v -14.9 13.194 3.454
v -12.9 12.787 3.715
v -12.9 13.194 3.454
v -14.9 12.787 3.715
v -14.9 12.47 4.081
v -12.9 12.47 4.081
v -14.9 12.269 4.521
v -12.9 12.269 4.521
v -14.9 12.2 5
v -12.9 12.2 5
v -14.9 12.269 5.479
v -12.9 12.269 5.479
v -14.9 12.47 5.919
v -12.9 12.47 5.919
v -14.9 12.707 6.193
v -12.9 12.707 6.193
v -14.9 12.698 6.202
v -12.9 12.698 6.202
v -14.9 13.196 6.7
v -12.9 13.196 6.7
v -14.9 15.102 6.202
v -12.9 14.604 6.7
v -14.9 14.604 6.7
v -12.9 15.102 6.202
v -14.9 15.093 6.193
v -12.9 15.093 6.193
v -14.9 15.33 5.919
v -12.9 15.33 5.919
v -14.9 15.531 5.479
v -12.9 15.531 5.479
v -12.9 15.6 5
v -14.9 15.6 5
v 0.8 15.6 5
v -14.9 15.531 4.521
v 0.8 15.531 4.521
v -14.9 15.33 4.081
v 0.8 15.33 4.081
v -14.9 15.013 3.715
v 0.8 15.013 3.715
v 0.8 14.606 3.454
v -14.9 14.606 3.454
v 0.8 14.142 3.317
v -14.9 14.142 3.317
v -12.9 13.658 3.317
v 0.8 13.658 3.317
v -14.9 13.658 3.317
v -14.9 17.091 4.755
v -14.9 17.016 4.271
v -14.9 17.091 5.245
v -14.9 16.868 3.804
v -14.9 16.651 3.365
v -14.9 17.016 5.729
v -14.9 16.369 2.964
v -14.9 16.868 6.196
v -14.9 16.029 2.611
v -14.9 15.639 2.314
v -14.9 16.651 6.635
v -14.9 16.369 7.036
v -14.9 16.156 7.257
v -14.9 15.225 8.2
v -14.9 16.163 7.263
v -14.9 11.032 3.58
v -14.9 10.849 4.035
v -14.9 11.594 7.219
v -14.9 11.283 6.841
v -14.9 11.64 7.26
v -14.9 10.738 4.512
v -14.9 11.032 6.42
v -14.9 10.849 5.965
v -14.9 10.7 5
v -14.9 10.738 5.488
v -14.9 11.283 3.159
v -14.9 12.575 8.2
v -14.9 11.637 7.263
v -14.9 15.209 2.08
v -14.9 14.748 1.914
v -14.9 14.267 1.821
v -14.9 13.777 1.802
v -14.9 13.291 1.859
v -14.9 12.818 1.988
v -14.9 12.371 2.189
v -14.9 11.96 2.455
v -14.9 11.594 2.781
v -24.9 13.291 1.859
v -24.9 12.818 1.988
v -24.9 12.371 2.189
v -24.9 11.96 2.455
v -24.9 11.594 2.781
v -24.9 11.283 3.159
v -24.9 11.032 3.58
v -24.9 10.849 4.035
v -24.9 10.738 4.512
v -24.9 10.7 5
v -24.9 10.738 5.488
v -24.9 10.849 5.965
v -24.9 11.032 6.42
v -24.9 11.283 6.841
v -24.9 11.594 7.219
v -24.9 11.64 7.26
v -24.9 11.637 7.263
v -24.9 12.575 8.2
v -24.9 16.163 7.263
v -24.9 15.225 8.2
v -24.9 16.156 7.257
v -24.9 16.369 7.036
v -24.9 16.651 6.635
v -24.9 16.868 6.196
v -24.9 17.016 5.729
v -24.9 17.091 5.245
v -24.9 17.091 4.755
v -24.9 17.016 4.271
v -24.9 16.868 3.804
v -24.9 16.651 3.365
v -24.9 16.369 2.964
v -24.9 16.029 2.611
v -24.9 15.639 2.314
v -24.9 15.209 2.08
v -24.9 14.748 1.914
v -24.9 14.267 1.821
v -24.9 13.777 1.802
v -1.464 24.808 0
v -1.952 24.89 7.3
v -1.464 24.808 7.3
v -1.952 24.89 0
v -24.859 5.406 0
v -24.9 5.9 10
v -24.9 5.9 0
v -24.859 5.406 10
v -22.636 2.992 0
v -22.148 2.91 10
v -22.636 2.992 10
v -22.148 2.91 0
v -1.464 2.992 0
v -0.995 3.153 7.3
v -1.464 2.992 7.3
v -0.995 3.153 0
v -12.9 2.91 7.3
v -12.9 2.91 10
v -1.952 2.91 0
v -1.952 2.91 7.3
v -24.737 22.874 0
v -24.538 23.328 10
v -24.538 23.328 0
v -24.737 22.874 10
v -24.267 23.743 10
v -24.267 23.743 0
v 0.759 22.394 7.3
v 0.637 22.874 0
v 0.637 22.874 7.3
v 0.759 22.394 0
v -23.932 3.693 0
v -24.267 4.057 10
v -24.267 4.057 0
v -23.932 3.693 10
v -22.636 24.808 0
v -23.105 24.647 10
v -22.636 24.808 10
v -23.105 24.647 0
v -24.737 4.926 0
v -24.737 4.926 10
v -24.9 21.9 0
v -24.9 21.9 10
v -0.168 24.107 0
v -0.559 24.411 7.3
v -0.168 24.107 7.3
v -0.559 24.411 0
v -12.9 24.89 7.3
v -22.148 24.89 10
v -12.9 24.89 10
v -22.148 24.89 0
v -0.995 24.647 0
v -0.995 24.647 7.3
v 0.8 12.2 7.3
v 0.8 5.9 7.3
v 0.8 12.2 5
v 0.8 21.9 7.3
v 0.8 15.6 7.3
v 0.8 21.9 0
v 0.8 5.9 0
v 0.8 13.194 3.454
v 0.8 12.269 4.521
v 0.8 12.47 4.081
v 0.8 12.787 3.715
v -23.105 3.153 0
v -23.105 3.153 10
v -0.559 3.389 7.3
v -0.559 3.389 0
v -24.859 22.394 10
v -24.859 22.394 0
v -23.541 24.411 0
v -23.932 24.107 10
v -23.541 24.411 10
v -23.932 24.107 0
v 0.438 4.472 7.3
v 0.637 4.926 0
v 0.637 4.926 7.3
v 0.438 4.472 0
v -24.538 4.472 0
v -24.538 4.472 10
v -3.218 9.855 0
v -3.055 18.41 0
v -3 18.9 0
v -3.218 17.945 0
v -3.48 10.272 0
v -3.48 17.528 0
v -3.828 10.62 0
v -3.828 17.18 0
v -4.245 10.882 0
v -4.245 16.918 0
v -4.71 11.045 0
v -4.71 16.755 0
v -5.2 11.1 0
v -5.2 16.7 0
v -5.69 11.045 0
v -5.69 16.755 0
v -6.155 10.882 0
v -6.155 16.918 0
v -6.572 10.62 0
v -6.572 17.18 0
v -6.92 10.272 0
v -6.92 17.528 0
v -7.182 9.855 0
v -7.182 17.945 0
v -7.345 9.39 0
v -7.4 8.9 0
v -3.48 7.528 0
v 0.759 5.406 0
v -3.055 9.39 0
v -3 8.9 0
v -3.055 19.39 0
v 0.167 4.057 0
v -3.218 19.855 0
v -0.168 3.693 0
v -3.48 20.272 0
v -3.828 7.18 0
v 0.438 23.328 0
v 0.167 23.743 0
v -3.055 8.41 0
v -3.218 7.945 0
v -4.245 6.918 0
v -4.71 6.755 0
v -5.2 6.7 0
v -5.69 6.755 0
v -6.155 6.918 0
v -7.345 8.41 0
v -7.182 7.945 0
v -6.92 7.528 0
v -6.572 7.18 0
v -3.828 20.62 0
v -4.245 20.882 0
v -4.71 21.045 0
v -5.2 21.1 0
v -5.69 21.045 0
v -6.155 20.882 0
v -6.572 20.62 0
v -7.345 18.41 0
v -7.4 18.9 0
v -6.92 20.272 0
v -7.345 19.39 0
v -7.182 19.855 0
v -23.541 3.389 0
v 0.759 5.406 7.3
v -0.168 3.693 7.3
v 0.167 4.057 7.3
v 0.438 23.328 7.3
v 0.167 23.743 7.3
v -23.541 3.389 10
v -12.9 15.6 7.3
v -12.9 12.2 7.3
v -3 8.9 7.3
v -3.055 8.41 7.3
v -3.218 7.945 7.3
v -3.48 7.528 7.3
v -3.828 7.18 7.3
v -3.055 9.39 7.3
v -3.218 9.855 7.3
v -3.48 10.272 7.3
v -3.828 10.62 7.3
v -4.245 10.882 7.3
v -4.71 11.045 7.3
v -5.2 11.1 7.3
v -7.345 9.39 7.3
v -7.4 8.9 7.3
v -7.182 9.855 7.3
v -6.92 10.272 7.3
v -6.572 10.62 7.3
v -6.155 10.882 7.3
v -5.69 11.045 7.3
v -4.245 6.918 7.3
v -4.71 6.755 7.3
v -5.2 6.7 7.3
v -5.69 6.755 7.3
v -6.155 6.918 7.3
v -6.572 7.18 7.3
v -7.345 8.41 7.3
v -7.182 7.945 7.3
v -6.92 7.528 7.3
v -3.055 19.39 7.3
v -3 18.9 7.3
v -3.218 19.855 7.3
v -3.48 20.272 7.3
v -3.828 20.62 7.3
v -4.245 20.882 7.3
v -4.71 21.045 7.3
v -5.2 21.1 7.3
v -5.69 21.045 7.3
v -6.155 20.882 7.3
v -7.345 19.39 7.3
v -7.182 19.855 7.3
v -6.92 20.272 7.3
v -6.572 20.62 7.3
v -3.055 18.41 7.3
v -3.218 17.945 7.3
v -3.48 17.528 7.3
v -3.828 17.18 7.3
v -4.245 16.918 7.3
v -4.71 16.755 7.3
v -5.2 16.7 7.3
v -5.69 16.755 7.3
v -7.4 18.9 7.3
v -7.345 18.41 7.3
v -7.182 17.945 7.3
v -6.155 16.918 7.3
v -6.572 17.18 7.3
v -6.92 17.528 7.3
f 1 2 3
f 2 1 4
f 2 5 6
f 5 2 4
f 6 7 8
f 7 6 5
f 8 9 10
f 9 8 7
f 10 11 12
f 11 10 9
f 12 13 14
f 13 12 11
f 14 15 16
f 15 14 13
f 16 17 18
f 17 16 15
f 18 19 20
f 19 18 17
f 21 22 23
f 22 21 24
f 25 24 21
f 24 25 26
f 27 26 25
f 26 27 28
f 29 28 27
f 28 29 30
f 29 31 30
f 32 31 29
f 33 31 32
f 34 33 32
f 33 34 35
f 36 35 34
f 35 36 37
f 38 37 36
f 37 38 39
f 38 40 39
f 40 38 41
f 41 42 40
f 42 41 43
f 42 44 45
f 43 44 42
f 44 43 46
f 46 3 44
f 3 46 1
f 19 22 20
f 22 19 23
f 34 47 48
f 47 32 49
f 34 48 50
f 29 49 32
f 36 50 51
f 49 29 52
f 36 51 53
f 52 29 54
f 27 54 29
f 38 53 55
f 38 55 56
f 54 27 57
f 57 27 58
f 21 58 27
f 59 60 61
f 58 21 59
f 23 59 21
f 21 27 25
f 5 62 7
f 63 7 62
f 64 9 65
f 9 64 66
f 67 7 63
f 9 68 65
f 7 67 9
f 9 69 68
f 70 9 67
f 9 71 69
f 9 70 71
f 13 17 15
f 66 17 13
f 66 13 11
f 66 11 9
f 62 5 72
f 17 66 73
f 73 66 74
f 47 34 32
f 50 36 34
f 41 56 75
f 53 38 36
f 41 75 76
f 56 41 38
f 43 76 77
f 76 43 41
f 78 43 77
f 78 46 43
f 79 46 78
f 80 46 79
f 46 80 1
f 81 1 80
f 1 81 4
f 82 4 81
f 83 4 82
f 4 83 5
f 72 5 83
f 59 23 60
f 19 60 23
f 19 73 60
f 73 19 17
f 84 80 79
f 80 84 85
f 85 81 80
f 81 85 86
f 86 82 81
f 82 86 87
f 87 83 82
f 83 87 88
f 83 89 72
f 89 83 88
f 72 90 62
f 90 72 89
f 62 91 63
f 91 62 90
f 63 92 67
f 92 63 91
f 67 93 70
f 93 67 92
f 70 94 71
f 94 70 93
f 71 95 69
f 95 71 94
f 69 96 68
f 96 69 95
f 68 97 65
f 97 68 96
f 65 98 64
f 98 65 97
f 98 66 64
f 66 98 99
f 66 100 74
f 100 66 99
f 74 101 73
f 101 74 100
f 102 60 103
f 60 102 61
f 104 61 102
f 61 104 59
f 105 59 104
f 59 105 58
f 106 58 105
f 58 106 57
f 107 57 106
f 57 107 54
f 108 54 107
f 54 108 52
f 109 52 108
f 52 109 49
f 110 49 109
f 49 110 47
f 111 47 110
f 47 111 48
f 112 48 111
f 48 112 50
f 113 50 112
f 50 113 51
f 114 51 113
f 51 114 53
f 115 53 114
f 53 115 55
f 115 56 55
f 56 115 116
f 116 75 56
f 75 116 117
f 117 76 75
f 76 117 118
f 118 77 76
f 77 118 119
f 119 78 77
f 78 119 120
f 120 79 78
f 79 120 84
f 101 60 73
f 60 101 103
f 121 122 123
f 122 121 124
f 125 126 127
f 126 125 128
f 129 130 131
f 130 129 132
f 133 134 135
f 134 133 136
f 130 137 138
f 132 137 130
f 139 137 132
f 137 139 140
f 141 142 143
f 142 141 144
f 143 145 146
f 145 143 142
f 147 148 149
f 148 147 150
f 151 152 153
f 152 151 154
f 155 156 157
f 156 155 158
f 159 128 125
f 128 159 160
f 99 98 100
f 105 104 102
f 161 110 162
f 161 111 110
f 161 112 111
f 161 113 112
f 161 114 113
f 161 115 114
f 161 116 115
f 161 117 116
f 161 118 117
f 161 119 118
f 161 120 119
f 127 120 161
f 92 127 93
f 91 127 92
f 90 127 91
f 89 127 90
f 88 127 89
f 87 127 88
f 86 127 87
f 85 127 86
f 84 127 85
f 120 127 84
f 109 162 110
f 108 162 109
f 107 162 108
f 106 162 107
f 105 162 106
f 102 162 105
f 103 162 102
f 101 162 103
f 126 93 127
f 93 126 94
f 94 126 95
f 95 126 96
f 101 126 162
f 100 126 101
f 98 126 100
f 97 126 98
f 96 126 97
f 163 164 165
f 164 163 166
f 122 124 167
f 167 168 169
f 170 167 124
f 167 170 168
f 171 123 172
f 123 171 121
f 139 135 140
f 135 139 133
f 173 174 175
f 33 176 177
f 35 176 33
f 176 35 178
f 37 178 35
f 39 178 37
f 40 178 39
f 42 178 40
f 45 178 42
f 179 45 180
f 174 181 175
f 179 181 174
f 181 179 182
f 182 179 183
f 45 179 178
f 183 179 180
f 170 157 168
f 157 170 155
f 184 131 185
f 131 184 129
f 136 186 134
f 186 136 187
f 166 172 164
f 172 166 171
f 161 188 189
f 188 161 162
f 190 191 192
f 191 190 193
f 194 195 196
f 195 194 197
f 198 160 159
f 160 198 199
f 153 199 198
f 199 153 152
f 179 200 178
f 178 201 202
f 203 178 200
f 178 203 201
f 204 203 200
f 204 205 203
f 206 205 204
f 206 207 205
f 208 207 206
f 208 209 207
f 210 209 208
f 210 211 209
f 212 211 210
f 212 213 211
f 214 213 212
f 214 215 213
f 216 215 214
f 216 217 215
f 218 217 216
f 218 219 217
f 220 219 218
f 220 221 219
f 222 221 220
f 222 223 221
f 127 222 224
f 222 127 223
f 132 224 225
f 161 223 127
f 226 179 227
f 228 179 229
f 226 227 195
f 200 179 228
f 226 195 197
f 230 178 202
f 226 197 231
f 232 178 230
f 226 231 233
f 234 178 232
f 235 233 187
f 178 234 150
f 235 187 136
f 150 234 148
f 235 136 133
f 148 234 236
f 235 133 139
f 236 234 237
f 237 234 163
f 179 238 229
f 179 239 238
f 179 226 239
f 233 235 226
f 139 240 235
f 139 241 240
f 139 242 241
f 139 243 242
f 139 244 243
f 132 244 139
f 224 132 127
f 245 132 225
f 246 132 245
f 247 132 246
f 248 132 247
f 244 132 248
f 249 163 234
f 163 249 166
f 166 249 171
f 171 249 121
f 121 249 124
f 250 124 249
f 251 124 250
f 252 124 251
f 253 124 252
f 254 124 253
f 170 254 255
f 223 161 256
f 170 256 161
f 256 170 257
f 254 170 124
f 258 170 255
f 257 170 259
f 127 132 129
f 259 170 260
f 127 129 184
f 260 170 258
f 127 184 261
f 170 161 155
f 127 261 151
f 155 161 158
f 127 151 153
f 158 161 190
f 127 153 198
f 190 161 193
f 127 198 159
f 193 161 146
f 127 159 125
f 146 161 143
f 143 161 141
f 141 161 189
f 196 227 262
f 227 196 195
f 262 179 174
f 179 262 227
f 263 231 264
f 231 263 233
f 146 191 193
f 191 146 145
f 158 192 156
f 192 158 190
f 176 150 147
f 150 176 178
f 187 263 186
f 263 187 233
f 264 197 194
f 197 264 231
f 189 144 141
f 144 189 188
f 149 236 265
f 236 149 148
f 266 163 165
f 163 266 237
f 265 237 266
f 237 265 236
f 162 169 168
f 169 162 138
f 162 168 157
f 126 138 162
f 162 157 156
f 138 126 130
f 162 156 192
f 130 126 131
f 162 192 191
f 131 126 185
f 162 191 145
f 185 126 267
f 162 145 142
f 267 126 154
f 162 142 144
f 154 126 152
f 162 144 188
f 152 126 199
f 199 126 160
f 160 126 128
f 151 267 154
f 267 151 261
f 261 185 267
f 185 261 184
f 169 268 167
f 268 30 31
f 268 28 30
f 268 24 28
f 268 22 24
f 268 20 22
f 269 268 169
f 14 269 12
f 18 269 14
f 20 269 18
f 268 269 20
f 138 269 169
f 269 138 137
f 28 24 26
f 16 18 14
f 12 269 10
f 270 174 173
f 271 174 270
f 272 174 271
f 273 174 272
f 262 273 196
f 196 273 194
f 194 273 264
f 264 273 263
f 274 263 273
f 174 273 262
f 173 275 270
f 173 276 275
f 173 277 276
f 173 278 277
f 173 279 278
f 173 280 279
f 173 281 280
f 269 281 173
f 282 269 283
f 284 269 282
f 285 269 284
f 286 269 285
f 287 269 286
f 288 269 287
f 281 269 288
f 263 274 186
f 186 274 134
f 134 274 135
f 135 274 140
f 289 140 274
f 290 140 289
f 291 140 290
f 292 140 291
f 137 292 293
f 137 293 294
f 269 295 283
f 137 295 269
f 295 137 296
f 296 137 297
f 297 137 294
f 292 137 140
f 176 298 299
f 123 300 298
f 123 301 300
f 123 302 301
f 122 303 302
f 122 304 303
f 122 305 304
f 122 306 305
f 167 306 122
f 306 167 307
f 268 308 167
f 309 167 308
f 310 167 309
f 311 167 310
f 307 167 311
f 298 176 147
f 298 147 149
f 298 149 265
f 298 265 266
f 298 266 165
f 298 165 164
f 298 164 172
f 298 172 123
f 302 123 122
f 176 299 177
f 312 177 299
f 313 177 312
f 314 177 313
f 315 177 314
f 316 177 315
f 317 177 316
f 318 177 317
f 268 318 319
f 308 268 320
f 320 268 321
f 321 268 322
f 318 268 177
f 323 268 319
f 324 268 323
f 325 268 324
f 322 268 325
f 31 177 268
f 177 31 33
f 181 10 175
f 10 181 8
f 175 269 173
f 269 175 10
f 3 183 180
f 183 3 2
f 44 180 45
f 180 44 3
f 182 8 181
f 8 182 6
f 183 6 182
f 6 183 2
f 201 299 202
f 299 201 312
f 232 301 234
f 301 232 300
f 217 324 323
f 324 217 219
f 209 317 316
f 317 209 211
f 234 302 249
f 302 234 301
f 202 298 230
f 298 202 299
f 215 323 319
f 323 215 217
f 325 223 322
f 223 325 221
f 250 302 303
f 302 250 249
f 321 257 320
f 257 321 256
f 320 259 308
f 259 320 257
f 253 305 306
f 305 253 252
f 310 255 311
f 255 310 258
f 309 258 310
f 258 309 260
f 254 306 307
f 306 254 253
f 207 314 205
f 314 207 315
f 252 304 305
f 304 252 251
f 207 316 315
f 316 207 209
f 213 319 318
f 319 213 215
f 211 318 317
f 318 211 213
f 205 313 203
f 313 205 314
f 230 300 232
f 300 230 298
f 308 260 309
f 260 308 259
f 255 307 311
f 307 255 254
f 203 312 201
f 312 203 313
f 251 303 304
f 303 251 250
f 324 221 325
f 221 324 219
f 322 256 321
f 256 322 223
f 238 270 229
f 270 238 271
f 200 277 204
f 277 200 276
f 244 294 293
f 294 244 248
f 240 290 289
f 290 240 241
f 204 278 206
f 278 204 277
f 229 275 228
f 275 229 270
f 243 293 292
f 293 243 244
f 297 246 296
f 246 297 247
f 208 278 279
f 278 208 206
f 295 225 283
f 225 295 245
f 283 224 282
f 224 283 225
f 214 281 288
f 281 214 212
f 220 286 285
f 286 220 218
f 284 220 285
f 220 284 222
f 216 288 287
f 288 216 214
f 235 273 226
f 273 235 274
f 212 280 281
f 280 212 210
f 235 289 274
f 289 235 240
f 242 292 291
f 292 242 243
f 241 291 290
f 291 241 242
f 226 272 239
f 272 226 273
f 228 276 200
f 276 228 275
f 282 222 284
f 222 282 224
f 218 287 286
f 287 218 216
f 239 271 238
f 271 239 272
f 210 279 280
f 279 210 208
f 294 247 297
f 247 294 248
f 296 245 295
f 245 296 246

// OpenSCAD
// file: functions.scad
/*******************************************************************

This OpenSCAD code and its rendered 3D model are part of the

	Kühling&Kühling RepRap Industrial 3D Printer


All details, BOM, assembling instructions and latest sources:
	http://kuehlingkuehling.de

Designed and developed by:
	Jonas Kühling <mail@jonaskuehling.de>
	Simon Kühling <mail@simonkuehling.de>

Licensed under:
	Creative Commons Attribution-ShareAlike
	CC BY-SA 3.0
	http://creativecommons.org/licenses/by-sa/3.0/

*******************************************************************/

module teardrop (r=4.5,h=20,alpha=45,teardropcorner=0,fulldrop=0){		// tear drop hole for top-centering
											// use teardropcorner=1 for bottom horizontal corners
	render()
	translate([-h/2,0,0])
		rotate([-270,0+(teardropcorner*180),90])
			difference(){
				linear_extrude(height=h){
					circle(r);
					polygon(points=[[0,0],[r*cos(alpha),r*sin(alpha)],[0,r/sin(alpha)],[-r*cos(alpha),r*sin(alpha)]], paths=[[0,1,2,3]]);
				}
				if(fulldrop==0) 
					translate([0,(r/sin(alpha))/2+r,h/2]) cube([2*r+2,r/sin(alpha),h+2],center=true);
			}
}

//teardrop(4.5,22,fulldrop=true);



module teardropcentering (r=4.5,h=20,alpha=45){				// tear drop hole for top-centering
	centering_offset_factor = 1.1;
	render()
	translate([-h/2,0,0])
		rotate([-270,0,90])
			difference(){
				linear_extrude(height=h){
					circle(r, $fn=24);
					polygon(points=[[0,0],[r*cos(alpha),r*sin(alpha)],[0,r/sin(alpha)],[-r*cos(alpha),r*sin(alpha)]], paths=[[0,1,2,3]]);
				}
				translate([0,(r/sin(alpha))/2+r*centering_offset_factor,h/2]) cube([2*r+2,r/sin(alpha),h+2],center=true);
			}
}

//teardropcentering();



module teardropcentering_half (r=4.5,h=20, bottom=0,alpha=45){				// tear drop hole for top-centering
																// upper half (bottom=0) or bottom half (bottom=1)
	centering_offset_factor = 1.2;
	render()
	translate([-h/2,0,0])
		rotate([-270,0,90])
			difference(){
				linear_extrude(height=h){
					circle(r, $fn=24);
					polygon(points=[[0,0],[r*cos(alpha),r*sin(alpha)],[0,r/sin(alpha)],[-r*cos(alpha),r*sin(alpha)]], paths=[[0,1,2,3]]);
				}
				translate([0,(r/sin(alpha))/2+r*centering_offset_factor,h/2]) cube([2*r+2,r/sin(alpha),h+2],center=true);
				translate([0,-(r*centering_offset_factor)/2-0.5+bottom*(r*centering_offset_factor+1),h/2]) cube([2*r+2,r*centering_offset_factor+1,h+2],center=true);
			}
}

//teardropcentering_half(bottom=0);


module polyhole(d,h){
	n = max(round(2 * d),3);
	cylinder(h = h, r = (d / 2) / cos (180 / n), $fn = n, center=true);
}



module roundcorner(radius,edge_length){
	render()
	translate([0,0,-1])
		difference(){
			translate([-1,-1,0])
				cube(size = [radius+1,radius+1,edge_length+2], center = false);
			translate(v = [radius,radius,-1])
				cylinder(h = edge_length+4, r=radius, center=false,$fs=0.1);
		}
}

//roundcorner(5,5);



module roundcorner_tear(radius,edge_length){
	render()
	difference(){
		translate([-1,-1,-1])
			cube(size = [edge_length+2, radius+1, radius+1], center = false);
		translate([(edge_length+4)/2-2, radius, radius])
			teardrop(radius, edge_length+4,teardropcorner=1);
	}
}

//roundcorner_tear(8,20);


module roundedge_tear(radius){
	render()
	difference(){
		translate([-1,-1,-1])
			cube(size = [radius+1, radius+1, radius+1], center = false);
		translate([radius,radius,radius])
			union(){
				sphere(r=radius, $fs=0.1);
				translate([0,0,-radius])
					cylinder(r1=(radius*sin(45))-(radius-(radius*sin(45))),r2=radius*sin(45),h=(radius-(radius*sin(45))), $fs=0.1);
			}
	}
}

//roundedge_tear(20);



module roundedge(radius){
	render()
	difference(){
		translate([-1,-1,-1])
			cube(size = [radius+1, radius+1, radius+1], center = false);
		translate([radius,radius,radius])
			sphere(r=radius, $fs=0.1);
	}
}

//roundedge(5);


module nut_trap(nut_wrench_size,trap_height,vertical=0, clearance=0.2,center=true){		// M3 wrench size = 5.5
	radius = cornerdiameter(nut_wrench_size+2*clearance) /2;
	rotate([0,vertical*90,0])
		cylinder(h = trap_height, r = radius, center=center, $fn = 6);
}

//nut_trap(5,5,0);

module nut_slot(nut_wrench_size,nut_height, nut_elevation,vertical=0, clearance=0.2){		// M3 wrench size = 5.5
	radius = cornerdiameter(nut_wrench_size+2*clearance) /2;
	slot_height = nut_height+2*clearance;
	slot_width = nut_wrench_size+2*clearance;
	rotate([0,vertical*270,0]){
		cylinder(h = slot_height, r = radius, center=true, $fn = 6);
		translate([0,-slot_width/2,-slot_height/2]) cube([nut_elevation+1,slot_width,slot_height]);
	}
}

//nut_slot(5.5,3,4,1);

function cornerdiameter(wrench_size) =  2* ((wrench_size)/2)/ cos(180/6);
function cornerdiameter_8(wrench_size) =  2* ((wrench_size)/2)/ cos(180/8);
// file: extruder_hotend.scad
/*******************************************************************

This OpenSCAD code and its rendered 3D model are part of the

	Kühling&Kühling RepRap Industrial 3D Printer


All details, BOM, assembling instructions and latest sources:
	http://kuehlingkuehling.de

Designed and developed by:
	Jonas Kühling <mail@jonaskuehling.de>
	Simon Kühling <mail@simonkuehling.de>

Licensed under:
	Creative Commons Attribution-ShareAlike
	CC BY-SA 3.0
	http://creativecommons.org/licenses/by-sa/3.0/

*******************************************************************/

include <configuration.scad>

///// RENDER RIGHT HOTEND ADAPTER /////
//rotate([90,0,0]) translate([0,-clearance-wall,0])		// for printing
//extruder_hotend();

///// RENDER LEFT EXTRUDER /////
rotate([90,0,0]) translate([0,-clearance-wall,0])		// for printing
mirror([1,0,0]) extruder_hotend();




module extruder_hotend(){

	difference(){

		// main body
		translate([0,clearance+wall,-extruder_hotend_body_height])
			hull(){
				translate([-extruder_hotend_body_width/2+clearance/2,0,extruder_hotend_body_height-wall])
					cube([extruder_hotend_body_width-clearance/2,extruder_hotend_body_length-clearance-wall,wall]);
				translate([-extruder_hotend_body_width/2+clearance/2,0,0])
					cube([wall,extruder_hotend_body_length-clearance-wall,wall]);
				translate([extruder_hotend_body_width/2-wall,0,wall])
					rotate([-90,0,0])
						cylinder(r=wall,h=extruder_hotend_body_length-clearance-wall);
			}


		// hotend countersink
		translate([extruder_drivegear_dia/2,extruder_hotend_body_length-extruder_gearbox_drivegear_dist,-(extruder_hotend_body_height+2)/2+1])
			rotate([0,0,90]) rotate([0,90,0])
				teardrop(extruder_hotend_insulator_dia/2+clearance,extruder_hotend_body_height+2);

		// mount and adjustment screw holes
		hull(){
			translate([extruder_hotend_body_width/2-wall-clearance-extruder_mount_screw_dia/2,-1,-wall-clearance-extruder_mount_screw_dia/2])
				rotate([-90,0,0])
					cylinder(r=extruder_mount_screw_dia/2+clearance,h=extruder_hotend_body_length+2);
			translate([extruder_hotend_body_width/2-wall-clearance-extruder_mount_screw_dia/2,-1,-wall-clearance-extruder_mount_screw_dia/2-extruder_hotend_adapter_adjustment_range])
				rotate([-90,0,0])
					cylinder(r=extruder_mount_screw_dia/2+clearance,h=extruder_hotend_body_length+2);
		}
		hull(){
			translate([extruder_drivegear_dia/2-extruder_hotend_insulator_dia/2-clearance-wall-clearance-extruder_mount_screw_dia/2,-1,-wall-clearance-extruder_mount_screw_dia/2])
				rotate([-90,0,0])
					cylinder(r=extruder_mount_screw_dia/2+clearance,h=extruder_hotend_body_length+2);
			translate([extruder_drivegear_dia/2-extruder_hotend_insulator_dia/2-clearance-wall-clearance-extruder_mount_screw_dia/2,-1,-wall-clearance-extruder_mount_screw_dia/2-extruder_hotend_adapter_adjustment_range])
				rotate([-90,0,0])
					cylinder(r=extruder_mount_screw_dia/2+clearance,h=extruder_hotend_body_length+2);
		}

		// hotend insulator mount screw holes and nut traps
		translate([extruder_drivegear_dia/2+extruder_hotend_insulator_dia/2,-1,-extruder_hotend_body_height+extruder_hotend_insulator_countersink-extruder_hotend_insulator_groove_pos])
			rotate([-90,0,0])
				cylinder(r=extruder_hotend_mount_screw_dia/2+clearance,h=extruder_hotend_body_length+2);
		translate([extruder_drivegear_dia/2-extruder_hotend_insulator_dia/2,-1,-extruder_hotend_body_height+extruder_hotend_insulator_countersink-extruder_hotend_insulator_groove_pos])
			rotate([-90,0,0])
				cylinder(r=extruder_hotend_mount_screw_dia/2+clearance,h=extruder_hotend_body_length+2);
		translate([extruder_drivegear_dia/2+extruder_hotend_insulator_dia/2,(extruder_hotend_body_length)/2+extruder_hotend_body_length-extruder_gearbox_drivegear_dist+extruder_hotend_insulator_dia/2+clearance+2*wall,-extruder_hotend_body_height+extruder_hotend_insulator_countersink-extruder_hotend_insulator_groove_pos])
			rotate([90,0,0])
				nut_trap(extruder_hotend_mount_screw_nut_wrench,extruder_hotend_body_length);
		translate([extruder_drivegear_dia/2-extruder_hotend_insulator_dia/2,(extruder_hotend_body_length)/2+extruder_hotend_body_length-extruder_gearbox_drivegear_dist+extruder_hotend_insulator_dia/2+clearance+2*wall,-extruder_hotend_body_height+extruder_hotend_insulator_countersink-extruder_hotend_insulator_groove_pos])
			rotate([90,0,0])
				nut_trap(extruder_hotend_mount_screw_nut_wrench,extruder_hotend_body_length);

		// hotend cable channel
		translate([-extruder_front_body_width/2+extruder_mount_screw_washer_dia/2-wall_thin/2,wall_thin,-extruder_hotend_body_height-1])
			cube([extruder_watercoolingtube_dia,extruder_watercoolingtube_dia-wall_thin+wall,extruder_hotend_body_height+2]);
		translate([-extruder_front_body_width/2+extruder_mount_screw_washer_dia/2,-1,-extruder_hotend_body_height-1])
			cube([extruder_watercoolingtube_dia-wall_thin,wall_thin+2,extruder_hotend_body_height+2]);
/*
		// hotend cable channel
		translate([-extruder_front_body_width/2+extruder_mount_screw_washer_dia/2-wall_thin/2,wall_thin,-extruder_front_body_z_addition_bottom-1])
			cube([extruder_watercoolingtube_dia,extruder_watercoolingtube_dia-wall_thin+wall,extruder_front_body_height+extruder_front_body_z_addition_bottom+2]);
		translate([-extruder_front_body_width/2+extruder_mount_screw_washer_dia/2,-1,-extruder_front_body_z_addition_bottom-1])
			cube([extruder_watercoolingtube_dia-wall_thin,wall_thin+2,extruder_front_body_height+extruder_front_body_z_addition_bottom+2]);
*/

	}

}
// main file
/*******************************************************************

This OpenSCAD code and its rendered 3D model are part of the

	Kühling&Kühling RepRap Industrial 3D Printer


All details, BOM, assembling instructions and latest sources:
	http://kuehlingkuehling.de

Designed and developed by:
	Jonas Kühling <mail@jonaskuehling.de>
	Simon Kühling <mail@simonkuehling.de>

Licensed under:
	Creative Commons Attribution-ShareAlike
	CC BY-SA 3.0
	http://creativecommons.org/licenses/by-sa/3.0/

*******************************************************************/

include <configuration.scad>

/*
///// RENDER HOTEND ADAPTER /////
use <extruder_hotend.scad>
translate([0,0,-wall_thin]) union(){
	translate([extruder_front_body_width/2,0,0]) extruder_hotend();
	translate([-extruder_front_body_width/2,0,0]) mirror([1,0,0]) extruder_hotend();
}
*/

///// RENDER EXTRUDER /////
//rotate([90,0,0])	// for printing
//union(){
//	translate([extruder_front_body_width/2,0,0]) extruder_front();
//	translate([-extruder_front_body_width/2,0,0]) mirror([1,0,0]) extruder_front();
//}

///// RENDER IDLERS /////
//for(i=[0,1]) mirror([i,0,0]) translate([extruder_front_body_width/2,0,0])	// for assembling
//translate([-extruder_front_body_width/2-wall_thin,-3*wall-wall_thin,0]) rotate([0,-90,0]) translate([-extruder_drivegear_dia/2-filament_dia/2-wall_thin,0,0]) rotate([90,0,0])	// for printing
//extruder_idler();



///// RENDER FILAMENT TUBE CONNECTORS /////
//for(i=[0,1]) mirror([i,0,0]) translate([extruder_front_body_width/2,0,-extruder_front_body_z_addition_bottom])	// for assembling
rotate([0,-90,0]) translate([-extruder_drivegear_dia/2+wall_thin/2+extruder_idler_screw_washer_dia/2,0,-(extruder_front_body_height-wall-extruder_idler_screw_washer_dia/2-extruder_idler_screw_dia/2-clearance-wall)])	// for printing
extruder_filamenttubeconnector();


///// RENDER IDLER SCREW BAR /////
//for(i=[0,1]) mirror([i,0,0]) translate([extruder_front_body_width/2,0,0])	// for assembling
//rotate([0,90,0]) translate([-(extruder_drivegear_dia/2+filament_dia/2-clearance+bearing_dia/2+bearing_center_dia/2+clearance+wall+extruder_idler_screw_washer_dia/2-wall_thin),0,0])	// for printing
//extruder_idler_screwbar();


///// RENDER WATERCOOLINGTUBEMOUNT TOP
//extruder_watercoolingtubemount_top();

///// RENDER WATERCOOLINGTUBEMOUNT BOTTOM
//extruder_watercoolingtubemount_bottom();





module extruder_front(){
	difference(){

		// main body
		translate([0,0,-extruder_front_body_z_addition_bottom])
			hull(){
				translate([-extruder_front_body_width/2,0,extruder_front_body_height-wall])
					cube([wall,extruder_front_body_length,wall]);
				translate([extruder_front_body_width/2-wall,0,extruder_front_body_height-wall])
					rotate([-90,0,0])
						cylinder(r=wall,h=extruder_front_body_length);
				translate([extruder_front_body_width/2-wall,0,wall])
					rotate([-90,0,0])
						cylinder(r=wall,h=extruder_front_body_length);
				translate([-extruder_front_body_width/2,0,0])
					cube([wall,extruder_front_body_length,wall]);
			}

		// extruder hotend adapter clearance
		translate([-extruder_front_body_width/2-1,wall,-extruder_front_body_z_addition_bottom-1])
			cube([extruder_front_body_width+2,extruder_front_body_length-wall+1,extruder_front_body_z_addition_bottom+1]);

		// extruder stepper gearbox center and idler bearing clearance
		translate([0,extruder_front_body_length-nema17_gearbox_center_pitch-nema17_gearbox_shaft_length-wall_thin,extruder_drivegear_elevation])
			rotate([-90,0,0])
				cylinder(r=max(nema17_gearbox_center_dia/2+clearance,bearing_dia/2+wall_thin),h=extruder_front_body_length);
		translate([-wall_thin/2,-1,extruder_drivegear_elevation-(max(nema17_gearbox_center_dia/2+clearance,bearing_dia/2+wall_thin))])
			cube([extruder_front_body_width/2+wall_thin/2+1,extruder_front_body_length+2,extruder_front_body_height]);
		translate([extruder_front_body_width/2,0,extruder_drivegear_elevation-max(nema17_gearbox_center_dia/2+clearance,bearing_dia/2+wall_thin)])
			rotate([-90,0,0]) rotate([0,0,90])
				roundcorner(wall,extruder_front_body_length);

		// filament hole
		translate([extruder_drivegear_dia/2,extruder_front_body_length-extruder_gearbox_drivegear_dist,(extruder_drivegear_elevation+extruder_front_body_z_addition_bottom+1)/2-extruder_front_body_z_addition_bottom-1])
			rotate([0,0,90]) rotate([0,90,0])
				teardrop(filament_dia/2+extruder_filament_hole_clearance,extruder_drivegear_elevation+extruder_front_body_z_addition_bottom+1);

		// idler trap
		difference(){
			translate([0,-1,extruder_drivegear_elevation-max(nema17_gearbox_center_dia/2+clearance,bearing_dia/2+wall_thin)-3*wall])
				hull(){
					translate([wall-wall_thin/2,0,extruder_front_body_height-wall])
						rotate([-90,0,0])
							cylinder(r=wall,h=extruder_front_body_length+2);
					translate([extruder_front_body_width/2-2*wall,0,extruder_front_body_height-wall])
						rotate([-90,0,0])
							cylinder(r=wall,h=extruder_front_body_length+2);
					translate([wall-wall_thin/2,0,wall])
						rotate([-90,0,0])
							cylinder(r=wall,h=extruder_front_body_length+2);
					translate([extruder_front_body_width/2-2*wall,0,wall])
						rotate([-90,0,0])
							cylinder(r=wall,h=extruder_front_body_length+2);
				}
			translate([0,extruder_front_body_length-extruder_gearbox_drivegear_dist-filament_dia/2-wall_thin-wall,-extruder_front_body_z_addition_bottom])
				hull(){
					translate([-extruder_front_body_width/2+wall,0,extruder_front_body_height-wall])
						rotate([-90,0,0])
							cylinder(r=wall,h=filament_dia+2*wall_thin+2*wall);
					translate([extruder_front_body_width/2-wall,0,extruder_front_body_height-wall])
						rotate([-90,0,0])
							cylinder(r=wall,h=filament_dia+2*wall_thin+2*wall);
					translate([-extruder_front_body_width/2+wall,0,wall])
						rotate([-90,0,0])
							cylinder(r=wall,h=filament_dia+2*wall_thin+2*wall);
					translate([extruder_front_body_width/2-wall,0,wall])
						rotate([-90,0,0])
							cylinder(r=wall,h=filament_dia+2*wall_thin+2*wall);
				}
			translate([extruder_front_body_width/2-wall,-2,extruder_drivegear_elevation-max(nema17_gearbox_center_dia/2+clearance,bearing_dia/2+wall_thin)-wall+clearance/2])
				rotate([-90,0,0])
					cylinder(r=wall-clearance/2,h=extruder_front_body_length+4);
		}


		// extruder front mount screw holes
		translate([-extruder_back_body_width/2,-1,extruder_drivegear_elevation+nema17_gearbox_dia/2+clearance+wall+clearance+extruder_mount_screw_dia/2])
			rotate([-90,0,0])
				cylinder(r=extruder_mount_screw_dia/2+clearance,h=extruder_front_body_length+2);
		translate([-extruder_back_body_width/2,-1,wall+clearance+extruder_mount_screw_dia/2])
			rotate([-90,0,0])
				cylinder(r=extruder_mount_screw_dia/2+clearance,h=extruder_front_body_length+2);

		// extruder hotend adapter mount screw holes
		translate([extruder_back_body_width/2-wall-clearance-extruder_mount_screw_dia/2,-1,-wall-clearance-extruder_mount_screw_dia/2-extruder_hotend_adapter_adjustment_range])
			rotate([-90,0,0])
				cylinder(r=extruder_mount_screw_dia/2+clearance,h=extruder_front_body_length+2);
		translate([extruder_drivegear_dia/2-extruder_hotend_insulator_dia/2-clearance-wall-clearance-extruder_mount_screw_dia/2,-1,-wall-clearance-extruder_mount_screw_dia/2-extruder_hotend_adapter_adjustment_range])
			rotate([-90,0,0])
				cylinder(r=extruder_mount_screw_dia/2+clearance,h=extruder_front_body_length+2);

		// hotend cable channel
		translate([-extruder_front_body_width/2+extruder_mount_screw_washer_dia/2-wall_thin/2,wall_thin,-extruder_front_body_z_addition_bottom-1])
			cube([extruder_watercoolingtube_dia,extruder_watercoolingtube_dia-wall_thin+wall,extruder_front_body_height+extruder_front_body_z_addition_bottom+2]);
		translate([-extruder_front_body_width/2+extruder_mount_screw_washer_dia/2,-1,-extruder_front_body_z_addition_bottom-1])
			cube([extruder_watercoolingtube_dia-wall_thin,wall_thin+2,extruder_front_body_height+extruder_front_body_z_addition_bottom+2]);

		// idler screw holes and nut traps
		hull(){
			translate([-wall_thin/2-wall+extruder_front_body_width/2-(cornerdiameter(extruder_idler_screw_nut_wrench)*sin(22)+extruder_idler_screw_nut_height*cos(22)),extruder_front_body_length-extruder_gearbox_drivegear_dist+wall_thin/2+extruder_idler_screw_washer_dia/2,extruder_front_body_height-extruder_front_body_z_addition_bottom-wall-extruder_idler_screw_washer_dia/2])
				rotate([-90,0,0])
					teardrop(extruder_idler_screw_dia/2+clearance,extruder_front_body_width);
			translate([-wall_thin/2-wall+extruder_front_body_width/2-(cornerdiameter(extruder_idler_screw_nut_wrench)*sin(22)+extruder_idler_screw_nut_height*cos(22)),extruder_front_body_length-extruder_gearbox_drivegear_dist+wall_thin/2+extruder_idler_screw_washer_dia/2,extruder_front_body_height-extruder_front_body_z_addition_bottom-wall-extruder_idler_screw_dia/2])
				rotate([-90,0,0])
					teardrop(extruder_idler_screw_dia/2+clearance,extruder_front_body_width);
		}
		hull(){
			translate([-wall_thin/2-wall+extruder_front_body_width/2-(cornerdiameter(extruder_idler_screw_nut_wrench)*sin(22)+extruder_idler_screw_nut_height*cos(22)),extruder_front_body_length-extruder_gearbox_drivegear_dist-(wall_thin/2+extruder_idler_screw_washer_dia/2),extruder_front_body_height-extruder_front_body_z_addition_bottom-wall-extruder_idler_screw_washer_dia/2])
				rotate([-90,0,0])
					teardrop(extruder_idler_screw_dia/2+clearance,extruder_front_body_width);
			translate([-wall_thin/2-wall+extruder_front_body_width/2-(cornerdiameter(extruder_idler_screw_nut_wrench)*sin(22)+extruder_idler_screw_nut_height*cos(22)),extruder_front_body_length-extruder_gearbox_drivegear_dist-(wall_thin/2+extruder_idler_screw_washer_dia/2),extruder_front_body_height-extruder_front_body_z_addition_bottom-wall-extruder_idler_screw_dia/2])
				rotate([-90,0,0])
					teardrop(extruder_idler_screw_dia/2+clearance,extruder_front_body_width);
		}
		translate([-wall_thin/2-wall-clearance-(cornerdiameter(extruder_idler_screw_nut_wrench)*sin(22)+extruder_idler_screw_nut_height*cos(22))/2,extruder_front_body_length-extruder_gearbox_drivegear_dist-(wall_thin/2+extruder_idler_screw_washer_dia/2),extruder_front_body_height-extruder_front_body_z_addition_bottom-wall-extruder_idler_screw_washer_dia/2])
			rotate([0,-90,0])
				nut_slot(extruder_idler_screw_nut_wrench,cornerdiameter(extruder_idler_screw_nut_wrench)*sin(22)+extruder_idler_screw_nut_height*cos(22),extruder_front_body_height);
		translate([-wall_thin/2-wall-clearance-(cornerdiameter(extruder_idler_screw_nut_wrench)*sin(22)+extruder_idler_screw_nut_height*cos(22))/2,extruder_front_body_length-extruder_gearbox_drivegear_dist+(wall_thin/2+extruder_idler_screw_washer_dia/2),extruder_front_body_height-extruder_front_body_z_addition_bottom-wall-extruder_idler_screw_washer_dia/2])
			rotate([0,-90,0])
				nut_slot(extruder_idler_screw_nut_wrench,cornerdiameter(extruder_idler_screw_nut_wrench)*sin(22)+extruder_idler_screw_nut_height*cos(22),extruder_front_body_height);
	}

/*
	// drive gear dummy
	translate([0,extruder_front_body_length-extruder_gearbox_drivegear_dist-bearing_width/2,extruder_drivegear_elevation])
		rotate([-90,0,0])
%			cylinder(r=extruder_drivegear_dia/2,h=bearing_width);
*/
/*
	// idler bearing dummy
%	difference(){
		translate([extruder_drivegear_dia/2+filament_dia/2-clearance+bearing_dia/2,extruder_front_body_length-extruder_gearbox_drivegear_dist-bearing_width/2,extruder_drivegear_elevation])
			rotate([-90,0,0])
				cylinder(r=bearing_dia/2,h=bearing_width);
		translate([extruder_drivegear_dia/2+filament_dia/2-clearance+bearing_dia/2,extruder_front_body_length-extruder_gearbox_drivegear_dist-bearing_width/2-1,extruder_drivegear_elevation])
			rotate([-90,0,0])
				cylinder(r=4,h=bearing_width+2);
	}
*/
/*
	// filament tube dummy
%	translate([extruder_drivegear_dia/2,extruder_front_body_length-extruder_gearbox_drivegear_dist,extruder_front_body_height-10])
		cylinder(r=filament_tube_dia/2,h=50);
%	translate([extruder_drivegear_dia/2,extruder_front_body_length-extruder_gearbox_drivegear_dist,extruder_front_body_height-wall-extruder_idler_screw_washer_dia/2-extruder_idler_screw_dia/2-wall])
		cylinder(r=filament_tube_dia/2+wall,h=extruder_idler_screw_dia+2*wall);

	// filament dummy
%	translate([extruder_drivegear_dia/2,extruder_front_body_length-extruder_gearbox_drivegear_dist,-10])
		cylinder(r=filament_dia/2,h=extruder_front_body_height+50);
*/

}


module extruder_idler(){
	difference(){

		// main body
		union(){
			translate([0,0,extruder_drivegear_elevation-max(nema17_gearbox_center_dia/2+clearance,bearing_dia/2+wall_thin)-3*wall])
				hull(){
					translate([extruder_drivegear_dia/2+filament_dia/2+wall_thin,0,extruder_front_body_height-wall-(extruder_drivegear_elevation-max(nema17_gearbox_center_dia/2+clearance,bearing_dia/2+wall_thin)-3*wall)-extruder_front_body_z_addition_bottom])
						cube([wall,(extruder_front_body_length-extruder_gearbox_drivegear_dist)*2,wall]);
					translate([extruder_front_body_width/2-2*wall-clearance,0,extruder_front_body_height-wall-(extruder_drivegear_elevation-max(nema17_gearbox_center_dia/2+clearance,bearing_dia/2+wall_thin)-3*wall)-extruder_front_body_z_addition_bottom])
						rotate([-90,0,0])
							cylinder(r=wall,h=(extruder_front_body_length-extruder_gearbox_drivegear_dist)*2);
					translate([extruder_drivegear_dia/2+filament_dia/2+wall_thin,0,clearance])
						cube([wall,(extruder_front_body_length-extruder_gearbox_drivegear_dist)*2,wall]);
/*
						rotate([-90,0,0])
							cylinder(r=wall,h=(extruder_front_body_length-extruder_gearbox_drivegear_dist)*2);
*/
					translate([extruder_front_body_width/2-2*wall,0,wall])
						rotate([-90,0,0])
							cylinder(r=wall-clearance,h=(extruder_front_body_length-extruder_gearbox_drivegear_dist)*2);
				}
			translate([0,0,extruder_drivegear_elevation-max(nema17_gearbox_center_dia/2+clearance,bearing_dia/2+wall_thin)-3*wall])
				hull(){
					translate([extruder_drivegear_dia/2+filament_dia/2+wall_thin,0,extruder_front_body_height-wall-(extruder_drivegear_elevation-max(nema17_gearbox_center_dia/2+clearance,bearing_dia/2+wall_thin)-3*wall)-extruder_front_body_z_addition_bottom])
						cube([wall,(extruder_front_body_length-extruder_gearbox_drivegear_dist)*2,wall]);
					translate([extruder_drivegear_dia/2+filament_dia/2-clearance+bearing_dia/2+bearing_center_dia/2+clearance+wall-wall,0,extruder_front_body_height-wall-(extruder_drivegear_elevation-max(nema17_gearbox_center_dia/2+clearance,bearing_dia/2+wall_thin)-3*wall)-extruder_front_body_z_addition_bottom])
						rotate([-90,0,0])
							cylinder(r=wall,h=(extruder_front_body_length-extruder_gearbox_drivegear_dist)*2);
					translate([extruder_drivegear_dia/2+filament_dia/2+wall_thin+wall,0,wall+clearance+3*wall])
						rotate([-90,0,0])
							cylinder(r=wall,h=(extruder_front_body_length-extruder_gearbox_drivegear_dist)*2);
					translate([extruder_drivegear_dia/2+filament_dia/2-clearance+bearing_dia/2+bearing_center_dia/2+clearance+wall-wall,0,3*wall+clearance+wall])
						rotate([-90,0,0])
							cylinder(r=wall,h=(extruder_front_body_length-extruder_gearbox_drivegear_dist)*2);
				}
		}
		translate([extruder_front_body_width/2-wall,-2,extruder_drivegear_elevation-max(nema17_gearbox_center_dia/2+clearance,bearing_dia/2+wall_thin)-wall+clearance/2])
			rotate([-90,0,0])
				cylinder(r=wall+clearance/2,h=extruder_front_body_length+4);

		// idler hinge clearance
		translate([0,extruder_front_body_length-extruder_gearbox_drivegear_dist-filament_dia/2-wall_thin-wall-clearance,-extruder_front_body_z_addition_bottom])
			cube([extruder_front_body_width,filament_dia+2*wall_thin+2*wall+2*clearance,extruder_drivegear_elevation-max(nema17_gearbox_center_dia/2+clearance,bearing_dia/2+wall_thin)+wall_thin+extruder_front_body_z_addition_bottom]);

		// idler bearing clearance
		difference(){
			translate([0,extruder_front_body_length-extruder_gearbox_drivegear_dist-bearing_width/2-clearance-wall_thin,-extruder_front_body_z_addition_bottom])
				cube([extruder_front_body_width,bearing_width+2*clearance+2*wall_thin,extruder_drivegear_elevation+bearing_dia/2+wall_thin+extruder_front_body_z_addition_bottom]);
			hull(){
				translate([extruder_drivegear_dia/2+filament_dia/2-clearance+bearing_dia/2,extruder_front_body_length-extruder_gearbox_drivegear_dist-bearing_width/2-clearance-wall_thin/2-wall+(bearing_width+2*clearance+2*wall_thin+2*wall)/2,extruder_drivegear_elevation])
					rotate([0,90,0]) rotate([0,0,90])
						teardrop(bearing_center_dia/2+clearance+wall_thin,bearing_width+2*clearance+2*wall_thin+2*wall);
	//					cylinder(r=bearing_center_dia/2+clearance,h=bearing_width+2*clearance+2*wall_thin+2*wall);
				translate([0,extruder_front_body_length-extruder_gearbox_drivegear_dist-bearing_width/2-clearance-wall_thin/2-wall+(bearing_width+2*clearance+2*wall_thin+2*wall)/2,extruder_drivegear_elevation])
					rotate([0,90,0]) rotate([0,0,90])
						teardrop(bearing_center_dia/2+clearance+wall_thin,bearing_width+2*clearance+2*wall_thin+2*wall);
			}
		}


		// idler screw slots
		hull(){
			translate([-wall_thin/2-wall-wall_thin,extruder_front_body_length-extruder_gearbox_drivegear_dist+wall_thin/2+extruder_idler_screw_washer_dia/2,extruder_front_body_height-wall-extruder_idler_screw_washer_dia/2-extruder_front_body_z_addition_bottom])
				rotate([0,90,0])
					cylinder(r=extruder_idler_screw_dia/2+clearance,h=extruder_front_body_width);
			translate([-wall_thin/2-wall-wall_thin,extruder_front_body_length-extruder_gearbox_drivegear_dist+wall_thin/2+extruder_idler_screw_washer_dia/2,extruder_front_body_height-wall-extruder_idler_screw_washer_dia/2+extruder_front_body_height-extruder_front_body_z_addition_bottom])
				rotate([0,90,0])
					cylinder(r=extruder_idler_screw_dia/2+clearance,h=extruder_front_body_width);
		}
		hull(){
			translate([-wall_thin/2-wall-wall_thin,extruder_front_body_length-extruder_gearbox_drivegear_dist-(wall_thin/2+extruder_idler_screw_washer_dia/2),extruder_front_body_height-wall-extruder_idler_screw_washer_dia/2-extruder_front_body_z_addition_bottom])
				rotate([0,90,0])
					cylinder(r=extruder_idler_screw_dia/2+clearance,h=extruder_front_body_width);
			translate([-wall_thin/2-wall-wall_thin,extruder_front_body_length-extruder_gearbox_drivegear_dist-(wall_thin/2+extruder_idler_screw_washer_dia/2),extruder_front_body_height-wall-extruder_idler_screw_washer_dia/2+extruder_front_body_height-extruder_front_body_z_addition_bottom])
				rotate([0,90,0])
					cylinder(r=extruder_idler_screw_dia/2+clearance,h=extruder_front_body_width);
		}

		// idler screw bar recess
		translate([extruder_drivegear_dia/2+filament_dia/2-clearance+bearing_dia/2+bearing_center_dia/2+clearance+wall+extruder_idler_screw_washer_dia/2-wall_thin,-1,extruder_front_body_height-wall-extruder_idler_screw_washer_dia/2-extruder_front_body_z_addition_bottom])
			rotate([-90,0,0])
				cylinder(r=extruder_idler_screw_washer_dia/2,h=(extruder_front_body_length-extruder_gearbox_drivegear_dist)*2+2);

		// bearing bolt slot
		translate([extruder_drivegear_dia/2+filament_dia/2-clearance+bearing_dia/2,extruder_front_body_length-extruder_gearbox_drivegear_dist-bearing_width/2-clearance-wall_thin/2-wall+(bearing_width+2*clearance+2*wall_thin+2*wall)/2,extruder_drivegear_elevation])
			rotate([0,90,0]) rotate([0,0,90])
				teardrop(bearing_center_dia/2+clearance,bearing_width+2*clearance+2*wall_thin+2*wall);
		hull(){
			translate([extruder_drivegear_dia/2+filament_dia/2-clearance+bearing_dia/2-bearing_center_dia/16*7,extruder_front_body_length-extruder_gearbox_drivegear_dist-bearing_width/2-clearance-wall_thin/2-wall+(bearing_width+2*clearance+2*wall_thin+2*wall)/2,extruder_drivegear_elevation])
				rotate([0,90,0]) rotate([0,0,90])
					teardrop(bearing_center_dia/2+clearance,bearing_width+2*clearance+2*wall_thin+2*wall);
			translate([0,extruder_front_body_length-extruder_gearbox_drivegear_dist-bearing_width/2-clearance-wall_thin/2-wall+(bearing_width+2*clearance+2*wall_thin+2*wall)/2,extruder_drivegear_elevation])
				rotate([0,90,0]) rotate([0,0,90])
					teardrop(bearing_center_dia/2+clearance,bearing_width+2*clearance+2*wall_thin+2*wall);
		}
		difference(){
			hull(){
				translate([extruder_drivegear_dia/2+filament_dia/2-clearance+bearing_dia/2,extruder_front_body_length-extruder_gearbox_drivegear_dist-bearing_width/2-clearance-wall_thin,extruder_drivegear_elevation])
					rotate([-90,0,0])
						cylinder(r=bearing_dia/2,h=bearing_width+2*clearance+2*wall_thin);
				translate([extruder_drivegear_dia/2+filament_dia/2-clearance+bearing_dia/2-bearing_dia/2,extruder_front_body_length-extruder_gearbox_drivegear_dist-bearing_width/2-clearance-wall_thin,extruder_drivegear_elevation])
					rotate([-90,0,0])
						cylinder(r=bearing_dia/2,h=bearing_width+2*clearance+2*wall_thin);
			}
			translate([extruder_drivegear_dia/2+filament_dia/2-clearance+bearing_dia/2,extruder_front_body_length-extruder_gearbox_drivegear_dist-bearing_width/2-clearance-wall,extruder_drivegear_elevation])
				rotate([-90,0,0])
					cylinder(r1=bearing_center_dia/2+clearance+wall_thin+wall,r2=bearing_center_dia/2+clearance+wall_thin,h=wall);
			translate([extruder_drivegear_dia/2+filament_dia/2-clearance+bearing_dia/2,extruder_front_body_length-extruder_gearbox_drivegear_dist+bearing_width/2+clearance,extruder_drivegear_elevation])
				rotate([-90,0,0])
					cylinder(r1=bearing_center_dia/2+clearance+wall_thin,r2=bearing_center_dia/2+clearance+wall_thin+wall,h=wall);
		}
	}
}


module extruder_filamenttubeconnector(){
	difference(){
		union(){
			// main body
/*
			hull(){
				translate([extruder_drivegear_dia/2-(wall_thin/2+extruder_idler_screw_washer_dia/2)+wall,extruder_front_body_length-extruder_gearbox_drivegear_dist-(wall_thin/2+extruder_idler_screw_washer_dia/2)+wall,extruder_front_body_height-wall-extruder_idler_screw_washer_dia/2-extruder_idler_screw_dia/2-clearance-wall+(wall+clearance+extruder_idler_screw_dia/2+extruder_idler_screw_washer_dia/2+wall+clearance+wall+extruder_filamenttube_countersink)/2])
					rotate([0,-90,0])
						teardrop(wall,wall+clearance+extruder_idler_screw_dia/2+extruder_idler_screw_washer_dia/2+wall+clearance+wall+extruder_filamenttube_countersink);
				translate([extruder_drivegear_dia/2-(wall_thin/2+extruder_idler_screw_washer_dia/2)+wall,extruder_front_body_length-extruder_gearbox_drivegear_dist+(wall_thin/2+extruder_idler_screw_washer_dia/2)-wall,extruder_front_body_height-wall-extruder_idler_screw_washer_dia/2-extruder_idler_screw_dia/2-clearance-wall+(wall+clearance+extruder_idler_screw_dia/2+extruder_idler_screw_washer_dia/2+wall+clearance+wall+extruder_filamenttube_countersink)/2])
					rotate([0,-90,0])
						teardrop(wall,wall+clearance+extruder_idler_screw_dia/2+extruder_idler_screw_washer_dia/2+wall+clearance+wall+extruder_filamenttube_countersink);
				translate([extruder_drivegear_dia/2+(wall_thin/2+extruder_idler_screw_washer_dia/2)-wall,extruder_front_body_length-extruder_gearbox_drivegear_dist-(wall_thin/2+extruder_idler_screw_washer_dia/2)+wall,extruder_front_body_height-wall-extruder_idler_screw_washer_dia/2-extruder_idler_screw_dia/2-clearance-wall+(wall+clearance+extruder_idler_screw_dia/2+extruder_idler_screw_washer_dia/2+wall+clearance+wall+extruder_filamenttube_countersink)/2])
					rotate([0,-90,0])
						teardrop(wall,wall+clearance+extruder_idler_screw_dia/2+extruder_idler_screw_washer_dia/2+wall+clearance+wall+extruder_filamenttube_countersink);
				translate([extruder_drivegear_dia/2+(wall_thin/2+extruder_idler_screw_washer_dia/2)-wall,extruder_front_body_length-extruder_gearbox_drivegear_dist+(wall_thin/2+extruder_idler_screw_washer_dia/2)-wall,extruder_front_body_height-wall-extruder_idler_screw_washer_dia/2-extruder_idler_screw_dia/2-clearance-wall+(wall+clearance+extruder_idler_screw_dia/2+extruder_idler_screw_washer_dia/2+wall+clearance+wall+extruder_filamenttube_countersink)/2])
					rotate([0,-90,0])
						teardrop(wall,wall+clearance+extruder_idler_screw_dia/2+extruder_idler_screw_washer_dia/2+wall+clearance+wall+extruder_filamenttube_countersink);
			}
*/
////////////////// EXPERIMENTAL ///////////////////////
			// idler screw surrounding
			hull(){
				translate([extruder_drivegear_dia/2-(wall_thin/2+extruder_idler_screw_washer_dia/2),extruder_front_body_length-extruder_gearbox_drivegear_dist+wall_thin/2+extruder_idler_screw_washer_dia/2+wall,extruder_front_body_height-wall-extruder_idler_screw_washer_dia/2+(extruder_idler_screw_washer_dia/2+wall+clearance+wall+extruder_filamenttube_countersink)-wall])
					rotate([0,90,0])
						cylinder(r=wall,h=wall_thin+extruder_idler_screw_washer_dia);
				translate([extruder_drivegear_dia/2-(wall_thin/2+extruder_idler_screw_washer_dia/2),extruder_front_body_length-extruder_gearbox_drivegear_dist+wall_thin/2+extruder_idler_screw_washer_dia/2+wall,extruder_front_body_height-wall-extruder_idler_screw_washer_dia/2-wall])
					rotate([0,90,0])
						cylinder(r=wall,h=wall_thin+extruder_idler_screw_washer_dia);
				translate([extruder_drivegear_dia/2-(wall_thin/2+extruder_idler_screw_washer_dia/2),extruder_front_body_length-extruder_gearbox_drivegear_dist-(wall_thin/2+extruder_idler_screw_washer_dia/2)-wall,extruder_front_body_height-wall-extruder_idler_screw_washer_dia/2+(extruder_idler_screw_washer_dia/2+wall+clearance+wall+extruder_filamenttube_countersink)-wall])
					rotate([0,90,0])
						cylinder(r=wall,h=wall_thin+extruder_idler_screw_washer_dia);
				translate([extruder_drivegear_dia/2-(wall_thin/2+extruder_idler_screw_washer_dia/2),extruder_front_body_length-extruder_gearbox_drivegear_dist-(wall_thin/2+extruder_idler_screw_washer_dia/2)-wall,extruder_front_body_height-wall-extruder_idler_screw_washer_dia/2-wall])
					rotate([0,90,0])
						cylinder(r=wall,h=wall_thin+extruder_idler_screw_washer_dia);
			}
//////////////////////////////////////////////////////
		}

		// idler clearance
		translate([extruder_drivegear_dia/2+filament_dia/2+wall_thin-clearance,extruder_front_body_length-extruder_gearbox_drivegear_dist-(wall_thin+extruder_idler_screw_washer_dia+extruder_idler_screw_dia+2*clearance+2*wall+2)/2,extruder_front_body_height+clearance-(wall+clearance+extruder_idler_screw_dia/2+extruder_idler_screw_washer_dia/2+wall+clearance+wall+extruder_filamenttube_countersink)])
		cube([wall_thin+extruder_idler_screw_washer_dia,wall_thin+extruder_idler_screw_washer_dia+extruder_idler_screw_dia+2*clearance+2*wall+2,wall+clearance+extruder_idler_screw_dia/2+extruder_idler_screw_washer_dia/2+wall+clearance+wall+extruder_filamenttube_countersink]);

		// filament clearance
		translate([extruder_drivegear_dia/2,extruder_front_body_length-extruder_gearbox_drivegear_dist,extruder_front_body_height-wall-extruder_idler_screw_washer_dia/2-extruder_idler_screw_dia/2-clearance-wall+(wall+clearance+extruder_idler_screw_dia/2+extruder_idler_screw_washer_dia/2+wall+clearance+wall+extruder_filamenttube_countersink)/2])
			rotate([0,0,180]) rotate([0,-90,0])
				teardrop(filament_dia/2+clearance,wall+clearance+extruder_idler_screw_dia/2+extruder_idler_screw_washer_dia/2+wall+clearance+wall+extruder_filamenttube_countersink+2);
		translate([0,0,-extruder_filamenttube_countersink-wall])
			hull(){
				translate([extruder_drivegear_dia/2,extruder_front_body_length-extruder_gearbox_drivegear_dist,extruder_front_body_height-wall-extruder_idler_screw_washer_dia/2-extruder_idler_screw_dia/2-clearance-wall+(wall+clearance+extruder_idler_screw_dia/2+extruder_idler_screw_washer_dia/2+wall+clearance+wall+extruder_filamenttube_countersink)/2])
					rotate([0,0,180]) rotate([0,-90,0])
						teardrop(filament_dia/2+clearance,wall+clearance+extruder_idler_screw_dia/2+extruder_idler_screw_washer_dia/2+wall+clearance+wall+extruder_filamenttube_countersink);
				translate([extruder_drivegear_dia/2+extruder_front_body_width/2,extruder_front_body_length-extruder_gearbox_drivegear_dist,extruder_front_body_height-wall-extruder_idler_screw_washer_dia/2-extruder_idler_screw_dia/2-clearance-wall+(wall+clearance+extruder_idler_screw_dia/2+extruder_idler_screw_washer_dia/2+wall+clearance+wall+extruder_filamenttube_countersink)/2])
					rotate([0,0,180]) rotate([0,-90,0])
						teardrop(filament_dia/2+clearance,wall+clearance+extruder_idler_screw_dia/2+extruder_idler_screw_washer_dia/2+wall+clearance+wall+extruder_filamenttube_countersink);
			}

		// filament tube countersink
		translate([extruder_drivegear_dia/2,extruder_front_body_length-extruder_gearbox_drivegear_dist,extruder_front_body_height+clearance+wall+(wall+clearance+extruder_idler_screw_dia/2+extruder_idler_screw_washer_dia/2+wall+clearance+wall+extruder_filamenttube_countersink)/2])
			rotate([0,0,180]) rotate([0,-90,0])
				teardrop(extruder_filamenttube_dia/2+clearance,wall+clearance+extruder_idler_screw_dia/2+extruder_idler_screw_washer_dia/2+wall+clearance+wall+extruder_filamenttube_countersink+2);

		// idler screw holes
		translate([-wall_thin/2-wall-wall_thin,extruder_front_body_length-extruder_gearbox_drivegear_dist+wall_thin/2+extruder_idler_screw_washer_dia/2,extruder_front_body_height-wall-extruder_idler_screw_washer_dia/2])
			rotate([0,90,0])
				cylinder(r=extruder_idler_screw_dia/2+clearance,h=extruder_front_body_width);
		translate([-wall_thin/2-wall-wall_thin,extruder_front_body_length-extruder_gearbox_drivegear_dist-(wall_thin/2+extruder_idler_screw_washer_dia/2),extruder_front_body_height-wall-extruder_idler_screw_washer_dia/2])
			rotate([0,90,0])
				cylinder(r=extruder_idler_screw_dia/2+clearance,h=extruder_front_body_width);
	}
}


module extruder_watercoolingtubemount_top(){
	difference(){

		// main body
		hull(){
			translate([extruder_mount_screw_washer_dia/2+wall/2+extruder_watercoolingtube_dia/2+clearance+wall-wall,wall,0])
				cylinder(r=wall,h=extruder_mount_screw_washer_dia);
			translate([-(extruder_mount_screw_washer_dia/2+wall/2+extruder_watercoolingtube_dia/2+clearance+wall-wall),wall,0])
				cylinder(r=wall,h=extruder_mount_screw_washer_dia);
			translate([-(extruder_mount_screw_washer_dia/2+wall/2+extruder_watercoolingtube_dia/2+clearance+wall),extruder_watercoolingtube_dia+2*clearance+wall-wall,0])
				cube([2*(extruder_mount_screw_washer_dia/2+wall/2+extruder_watercoolingtube_dia/2+clearance+wall),wall,extruder_mount_screw_washer_dia]);
	
		}

		// watercoolingtube clearance
		translate([extruder_mount_screw_washer_dia/2+wall/2,extruder_watercoolingtube_dia/2+clearance+wall,-1])
			cylinder(r=extruder_watercoolingtube_dia/2+clearance,h=extruder_mount_screw_washer_dia+2);
		translate([-(extruder_mount_screw_washer_dia/2+wall/2),extruder_watercoolingtube_dia/2+clearance+wall,-1])
			cylinder(r=extruder_watercoolingtube_dia/2+clearance,h=extruder_mount_screw_washer_dia+2);
		translate([extruder_mount_screw_washer_dia/2+wall/2-extruder_watercoolingtube_dia/2-clearance,wall+clearance+extruder_watercoolingtube_dia/2,-1])
			cube([extruder_watercoolingtube_dia+2*clearance+wall+1,extruder_watercoolingtube_dia/2+clearance+1,extruder_mount_screw_washer_dia+2]);
		mirror([1,0,0]) translate([extruder_mount_screw_washer_dia/2+wall/2-extruder_watercoolingtube_dia/2-clearance,wall+clearance+extruder_watercoolingtube_dia/2,-1])
			cube([extruder_watercoolingtube_dia+2*clearance+wall+1,extruder_watercoolingtube_dia/2+clearance+1,extruder_mount_screw_washer_dia+2]);

		// extruder mount screw hole
		translate([0,(wall+2*clearance+extruder_watercoolingtube_dia)/2,extruder_mount_screw_washer_dia/2])
			rotate([0,0,90])
				teardrop(extruder_mount_screw_dia/2+clearance,wall+2*clearance+extruder_watercoolingtube_dia+2);
	}
}


module extruder_watercoolingtubemount_bottom(){
	difference(){

		// main body
		hull(){
			translate([extruder_back_body_width/4+wall+extruder_mount_screw_washer_dia/2+wall-wall,wall,0])
				cylinder(r=wall,h=extruder_mount_screw_washer_dia);
			translate([-(extruder_back_body_width/4+wall+extruder_mount_screw_washer_dia/2+wall-wall),wall,0])
				cylinder(r=wall,h=extruder_mount_screw_washer_dia);
			translate([-(extruder_back_body_width/4+wall+extruder_mount_screw_washer_dia/2+wall),extruder_watercoolingtube_dia+2*clearance+wall-wall,0])
				cube([2*(extruder_back_body_width/4+wall+extruder_mount_screw_washer_dia/2+wall),wall,extruder_mount_screw_washer_dia]);
	
		}

		// watercoolingtube clearance
		translate([extruder_mount_screw_washer_dia/2+wall/2,extruder_watercoolingtube_dia/2+clearance+wall,-1])
			cylinder(r=extruder_watercoolingtube_dia/2+clearance,h=extruder_mount_screw_washer_dia+2);
		translate([-(extruder_mount_screw_washer_dia/2+wall/2),extruder_watercoolingtube_dia/2+clearance+wall,-1])
			cylinder(r=extruder_watercoolingtube_dia/2+clearance,h=extruder_mount_screw_washer_dia+2);
		translate([extruder_mount_screw_washer_dia/2+wall/2-extruder_watercoolingtube_dia/2-clearance,wall+clearance+extruder_watercoolingtube_dia/2,-1])
			cube([extruder_watercoolingtube_dia+2*clearance,extruder_watercoolingtube_dia/2+clearance+1,extruder_mount_screw_washer_dia+2]);
		mirror([1,0,0]) translate([extruder_mount_screw_washer_dia/2+wall/2-extruder_watercoolingtube_dia/2-clearance,wall+clearance+extruder_watercoolingtube_dia/2,-1])
			cube([extruder_watercoolingtube_dia+2*clearance,extruder_watercoolingtube_dia/2+clearance+1,extruder_mount_screw_washer_dia+2]);

		// extruder mount screw hole
		hull(){
			translate([extruder_back_body_width/4+wall,(wall+2*clearance+extruder_watercoolingtube_dia)/2,extruder_mount_screw_washer_dia/2])
				rotate([0,0,90])
					teardrop(extruder_mount_screw_dia/2+clearance,wall+2*clearance+extruder_watercoolingtube_dia+2);
			translate([extruder_back_body_width/4+wall,(wall+2*clearance+extruder_watercoolingtube_dia)/2,-extruder_mount_screw_washer_dia/2])
				rotate([0,0,90])
					teardrop(extruder_mount_screw_dia/2+clearance,wall+2*clearance+extruder_watercoolingtube_dia+2);
		}
		hull(){
			translate([-(extruder_back_body_width/4+wall),(wall+2*clearance+extruder_watercoolingtube_dia)/2,extruder_mount_screw_washer_dia/2])
				rotate([0,0,90])
					teardrop(extruder_mount_screw_dia/2+clearance,wall+2*clearance+extruder_watercoolingtube_dia+2);
			translate([-(extruder_back_body_width/4+wall),(wall+2*clearance+extruder_watercoolingtube_dia)/2,-extruder_mount_screw_washer_dia/2])
				rotate([0,0,90])
					teardrop(extruder_mount_screw_dia/2+clearance,wall+2*clearance+extruder_watercoolingtube_dia+2);
		}
	}
}


module extruder_idler_screwbar(){
	difference(){

		// main body
		intersection(){
			translate([extruder_drivegear_dia/2+filament_dia/2-clearance+bearing_dia/2+bearing_center_dia/2+clearance+wall+extruder_idler_screw_washer_dia/2-wall_thin,0,extruder_front_body_height-wall-extruder_idler_screw_washer_dia/2])
				rotate([-90,0,0])
					cylinder(r=extruder_idler_screw_washer_dia/2,h=(extruder_front_body_length-extruder_gearbox_drivegear_dist)*2);
			cube([extruder_drivegear_dia/2+filament_dia/2-clearance+bearing_dia/2+bearing_center_dia/2+clearance+wall+extruder_idler_screw_washer_dia/2-wall_thin,(extruder_front_body_length-extruder_gearbox_drivegear_dist)*2,extruder_front_body_height*2]);
		}

	
		// idler screw holes
		translate([-wall_thin/2-wall-wall_thin,extruder_front_body_length-extruder_gearbox_drivegear_dist+wall_thin/2+extruder_idler_screw_washer_dia/2,extruder_front_body_height-wall-extruder_idler_screw_washer_dia/2])
			rotate([0,90,0])
				cylinder(r=extruder_idler_screw_dia/2+clearance,h=extruder_front_body_width);
		translate([-wall_thin/2-wall-wall_thin,extruder_front_body_length-extruder_gearbox_drivegear_dist-(wall_thin/2+extruder_idler_screw_washer_dia/2),extruder_front_body_height-wall-extruder_idler_screw_washer_dia/2])
			rotate([0,90,0])
				cylinder(r=extruder_idler_screw_dia/2+clearance,h=extruder_front_body_width);
	}
}
